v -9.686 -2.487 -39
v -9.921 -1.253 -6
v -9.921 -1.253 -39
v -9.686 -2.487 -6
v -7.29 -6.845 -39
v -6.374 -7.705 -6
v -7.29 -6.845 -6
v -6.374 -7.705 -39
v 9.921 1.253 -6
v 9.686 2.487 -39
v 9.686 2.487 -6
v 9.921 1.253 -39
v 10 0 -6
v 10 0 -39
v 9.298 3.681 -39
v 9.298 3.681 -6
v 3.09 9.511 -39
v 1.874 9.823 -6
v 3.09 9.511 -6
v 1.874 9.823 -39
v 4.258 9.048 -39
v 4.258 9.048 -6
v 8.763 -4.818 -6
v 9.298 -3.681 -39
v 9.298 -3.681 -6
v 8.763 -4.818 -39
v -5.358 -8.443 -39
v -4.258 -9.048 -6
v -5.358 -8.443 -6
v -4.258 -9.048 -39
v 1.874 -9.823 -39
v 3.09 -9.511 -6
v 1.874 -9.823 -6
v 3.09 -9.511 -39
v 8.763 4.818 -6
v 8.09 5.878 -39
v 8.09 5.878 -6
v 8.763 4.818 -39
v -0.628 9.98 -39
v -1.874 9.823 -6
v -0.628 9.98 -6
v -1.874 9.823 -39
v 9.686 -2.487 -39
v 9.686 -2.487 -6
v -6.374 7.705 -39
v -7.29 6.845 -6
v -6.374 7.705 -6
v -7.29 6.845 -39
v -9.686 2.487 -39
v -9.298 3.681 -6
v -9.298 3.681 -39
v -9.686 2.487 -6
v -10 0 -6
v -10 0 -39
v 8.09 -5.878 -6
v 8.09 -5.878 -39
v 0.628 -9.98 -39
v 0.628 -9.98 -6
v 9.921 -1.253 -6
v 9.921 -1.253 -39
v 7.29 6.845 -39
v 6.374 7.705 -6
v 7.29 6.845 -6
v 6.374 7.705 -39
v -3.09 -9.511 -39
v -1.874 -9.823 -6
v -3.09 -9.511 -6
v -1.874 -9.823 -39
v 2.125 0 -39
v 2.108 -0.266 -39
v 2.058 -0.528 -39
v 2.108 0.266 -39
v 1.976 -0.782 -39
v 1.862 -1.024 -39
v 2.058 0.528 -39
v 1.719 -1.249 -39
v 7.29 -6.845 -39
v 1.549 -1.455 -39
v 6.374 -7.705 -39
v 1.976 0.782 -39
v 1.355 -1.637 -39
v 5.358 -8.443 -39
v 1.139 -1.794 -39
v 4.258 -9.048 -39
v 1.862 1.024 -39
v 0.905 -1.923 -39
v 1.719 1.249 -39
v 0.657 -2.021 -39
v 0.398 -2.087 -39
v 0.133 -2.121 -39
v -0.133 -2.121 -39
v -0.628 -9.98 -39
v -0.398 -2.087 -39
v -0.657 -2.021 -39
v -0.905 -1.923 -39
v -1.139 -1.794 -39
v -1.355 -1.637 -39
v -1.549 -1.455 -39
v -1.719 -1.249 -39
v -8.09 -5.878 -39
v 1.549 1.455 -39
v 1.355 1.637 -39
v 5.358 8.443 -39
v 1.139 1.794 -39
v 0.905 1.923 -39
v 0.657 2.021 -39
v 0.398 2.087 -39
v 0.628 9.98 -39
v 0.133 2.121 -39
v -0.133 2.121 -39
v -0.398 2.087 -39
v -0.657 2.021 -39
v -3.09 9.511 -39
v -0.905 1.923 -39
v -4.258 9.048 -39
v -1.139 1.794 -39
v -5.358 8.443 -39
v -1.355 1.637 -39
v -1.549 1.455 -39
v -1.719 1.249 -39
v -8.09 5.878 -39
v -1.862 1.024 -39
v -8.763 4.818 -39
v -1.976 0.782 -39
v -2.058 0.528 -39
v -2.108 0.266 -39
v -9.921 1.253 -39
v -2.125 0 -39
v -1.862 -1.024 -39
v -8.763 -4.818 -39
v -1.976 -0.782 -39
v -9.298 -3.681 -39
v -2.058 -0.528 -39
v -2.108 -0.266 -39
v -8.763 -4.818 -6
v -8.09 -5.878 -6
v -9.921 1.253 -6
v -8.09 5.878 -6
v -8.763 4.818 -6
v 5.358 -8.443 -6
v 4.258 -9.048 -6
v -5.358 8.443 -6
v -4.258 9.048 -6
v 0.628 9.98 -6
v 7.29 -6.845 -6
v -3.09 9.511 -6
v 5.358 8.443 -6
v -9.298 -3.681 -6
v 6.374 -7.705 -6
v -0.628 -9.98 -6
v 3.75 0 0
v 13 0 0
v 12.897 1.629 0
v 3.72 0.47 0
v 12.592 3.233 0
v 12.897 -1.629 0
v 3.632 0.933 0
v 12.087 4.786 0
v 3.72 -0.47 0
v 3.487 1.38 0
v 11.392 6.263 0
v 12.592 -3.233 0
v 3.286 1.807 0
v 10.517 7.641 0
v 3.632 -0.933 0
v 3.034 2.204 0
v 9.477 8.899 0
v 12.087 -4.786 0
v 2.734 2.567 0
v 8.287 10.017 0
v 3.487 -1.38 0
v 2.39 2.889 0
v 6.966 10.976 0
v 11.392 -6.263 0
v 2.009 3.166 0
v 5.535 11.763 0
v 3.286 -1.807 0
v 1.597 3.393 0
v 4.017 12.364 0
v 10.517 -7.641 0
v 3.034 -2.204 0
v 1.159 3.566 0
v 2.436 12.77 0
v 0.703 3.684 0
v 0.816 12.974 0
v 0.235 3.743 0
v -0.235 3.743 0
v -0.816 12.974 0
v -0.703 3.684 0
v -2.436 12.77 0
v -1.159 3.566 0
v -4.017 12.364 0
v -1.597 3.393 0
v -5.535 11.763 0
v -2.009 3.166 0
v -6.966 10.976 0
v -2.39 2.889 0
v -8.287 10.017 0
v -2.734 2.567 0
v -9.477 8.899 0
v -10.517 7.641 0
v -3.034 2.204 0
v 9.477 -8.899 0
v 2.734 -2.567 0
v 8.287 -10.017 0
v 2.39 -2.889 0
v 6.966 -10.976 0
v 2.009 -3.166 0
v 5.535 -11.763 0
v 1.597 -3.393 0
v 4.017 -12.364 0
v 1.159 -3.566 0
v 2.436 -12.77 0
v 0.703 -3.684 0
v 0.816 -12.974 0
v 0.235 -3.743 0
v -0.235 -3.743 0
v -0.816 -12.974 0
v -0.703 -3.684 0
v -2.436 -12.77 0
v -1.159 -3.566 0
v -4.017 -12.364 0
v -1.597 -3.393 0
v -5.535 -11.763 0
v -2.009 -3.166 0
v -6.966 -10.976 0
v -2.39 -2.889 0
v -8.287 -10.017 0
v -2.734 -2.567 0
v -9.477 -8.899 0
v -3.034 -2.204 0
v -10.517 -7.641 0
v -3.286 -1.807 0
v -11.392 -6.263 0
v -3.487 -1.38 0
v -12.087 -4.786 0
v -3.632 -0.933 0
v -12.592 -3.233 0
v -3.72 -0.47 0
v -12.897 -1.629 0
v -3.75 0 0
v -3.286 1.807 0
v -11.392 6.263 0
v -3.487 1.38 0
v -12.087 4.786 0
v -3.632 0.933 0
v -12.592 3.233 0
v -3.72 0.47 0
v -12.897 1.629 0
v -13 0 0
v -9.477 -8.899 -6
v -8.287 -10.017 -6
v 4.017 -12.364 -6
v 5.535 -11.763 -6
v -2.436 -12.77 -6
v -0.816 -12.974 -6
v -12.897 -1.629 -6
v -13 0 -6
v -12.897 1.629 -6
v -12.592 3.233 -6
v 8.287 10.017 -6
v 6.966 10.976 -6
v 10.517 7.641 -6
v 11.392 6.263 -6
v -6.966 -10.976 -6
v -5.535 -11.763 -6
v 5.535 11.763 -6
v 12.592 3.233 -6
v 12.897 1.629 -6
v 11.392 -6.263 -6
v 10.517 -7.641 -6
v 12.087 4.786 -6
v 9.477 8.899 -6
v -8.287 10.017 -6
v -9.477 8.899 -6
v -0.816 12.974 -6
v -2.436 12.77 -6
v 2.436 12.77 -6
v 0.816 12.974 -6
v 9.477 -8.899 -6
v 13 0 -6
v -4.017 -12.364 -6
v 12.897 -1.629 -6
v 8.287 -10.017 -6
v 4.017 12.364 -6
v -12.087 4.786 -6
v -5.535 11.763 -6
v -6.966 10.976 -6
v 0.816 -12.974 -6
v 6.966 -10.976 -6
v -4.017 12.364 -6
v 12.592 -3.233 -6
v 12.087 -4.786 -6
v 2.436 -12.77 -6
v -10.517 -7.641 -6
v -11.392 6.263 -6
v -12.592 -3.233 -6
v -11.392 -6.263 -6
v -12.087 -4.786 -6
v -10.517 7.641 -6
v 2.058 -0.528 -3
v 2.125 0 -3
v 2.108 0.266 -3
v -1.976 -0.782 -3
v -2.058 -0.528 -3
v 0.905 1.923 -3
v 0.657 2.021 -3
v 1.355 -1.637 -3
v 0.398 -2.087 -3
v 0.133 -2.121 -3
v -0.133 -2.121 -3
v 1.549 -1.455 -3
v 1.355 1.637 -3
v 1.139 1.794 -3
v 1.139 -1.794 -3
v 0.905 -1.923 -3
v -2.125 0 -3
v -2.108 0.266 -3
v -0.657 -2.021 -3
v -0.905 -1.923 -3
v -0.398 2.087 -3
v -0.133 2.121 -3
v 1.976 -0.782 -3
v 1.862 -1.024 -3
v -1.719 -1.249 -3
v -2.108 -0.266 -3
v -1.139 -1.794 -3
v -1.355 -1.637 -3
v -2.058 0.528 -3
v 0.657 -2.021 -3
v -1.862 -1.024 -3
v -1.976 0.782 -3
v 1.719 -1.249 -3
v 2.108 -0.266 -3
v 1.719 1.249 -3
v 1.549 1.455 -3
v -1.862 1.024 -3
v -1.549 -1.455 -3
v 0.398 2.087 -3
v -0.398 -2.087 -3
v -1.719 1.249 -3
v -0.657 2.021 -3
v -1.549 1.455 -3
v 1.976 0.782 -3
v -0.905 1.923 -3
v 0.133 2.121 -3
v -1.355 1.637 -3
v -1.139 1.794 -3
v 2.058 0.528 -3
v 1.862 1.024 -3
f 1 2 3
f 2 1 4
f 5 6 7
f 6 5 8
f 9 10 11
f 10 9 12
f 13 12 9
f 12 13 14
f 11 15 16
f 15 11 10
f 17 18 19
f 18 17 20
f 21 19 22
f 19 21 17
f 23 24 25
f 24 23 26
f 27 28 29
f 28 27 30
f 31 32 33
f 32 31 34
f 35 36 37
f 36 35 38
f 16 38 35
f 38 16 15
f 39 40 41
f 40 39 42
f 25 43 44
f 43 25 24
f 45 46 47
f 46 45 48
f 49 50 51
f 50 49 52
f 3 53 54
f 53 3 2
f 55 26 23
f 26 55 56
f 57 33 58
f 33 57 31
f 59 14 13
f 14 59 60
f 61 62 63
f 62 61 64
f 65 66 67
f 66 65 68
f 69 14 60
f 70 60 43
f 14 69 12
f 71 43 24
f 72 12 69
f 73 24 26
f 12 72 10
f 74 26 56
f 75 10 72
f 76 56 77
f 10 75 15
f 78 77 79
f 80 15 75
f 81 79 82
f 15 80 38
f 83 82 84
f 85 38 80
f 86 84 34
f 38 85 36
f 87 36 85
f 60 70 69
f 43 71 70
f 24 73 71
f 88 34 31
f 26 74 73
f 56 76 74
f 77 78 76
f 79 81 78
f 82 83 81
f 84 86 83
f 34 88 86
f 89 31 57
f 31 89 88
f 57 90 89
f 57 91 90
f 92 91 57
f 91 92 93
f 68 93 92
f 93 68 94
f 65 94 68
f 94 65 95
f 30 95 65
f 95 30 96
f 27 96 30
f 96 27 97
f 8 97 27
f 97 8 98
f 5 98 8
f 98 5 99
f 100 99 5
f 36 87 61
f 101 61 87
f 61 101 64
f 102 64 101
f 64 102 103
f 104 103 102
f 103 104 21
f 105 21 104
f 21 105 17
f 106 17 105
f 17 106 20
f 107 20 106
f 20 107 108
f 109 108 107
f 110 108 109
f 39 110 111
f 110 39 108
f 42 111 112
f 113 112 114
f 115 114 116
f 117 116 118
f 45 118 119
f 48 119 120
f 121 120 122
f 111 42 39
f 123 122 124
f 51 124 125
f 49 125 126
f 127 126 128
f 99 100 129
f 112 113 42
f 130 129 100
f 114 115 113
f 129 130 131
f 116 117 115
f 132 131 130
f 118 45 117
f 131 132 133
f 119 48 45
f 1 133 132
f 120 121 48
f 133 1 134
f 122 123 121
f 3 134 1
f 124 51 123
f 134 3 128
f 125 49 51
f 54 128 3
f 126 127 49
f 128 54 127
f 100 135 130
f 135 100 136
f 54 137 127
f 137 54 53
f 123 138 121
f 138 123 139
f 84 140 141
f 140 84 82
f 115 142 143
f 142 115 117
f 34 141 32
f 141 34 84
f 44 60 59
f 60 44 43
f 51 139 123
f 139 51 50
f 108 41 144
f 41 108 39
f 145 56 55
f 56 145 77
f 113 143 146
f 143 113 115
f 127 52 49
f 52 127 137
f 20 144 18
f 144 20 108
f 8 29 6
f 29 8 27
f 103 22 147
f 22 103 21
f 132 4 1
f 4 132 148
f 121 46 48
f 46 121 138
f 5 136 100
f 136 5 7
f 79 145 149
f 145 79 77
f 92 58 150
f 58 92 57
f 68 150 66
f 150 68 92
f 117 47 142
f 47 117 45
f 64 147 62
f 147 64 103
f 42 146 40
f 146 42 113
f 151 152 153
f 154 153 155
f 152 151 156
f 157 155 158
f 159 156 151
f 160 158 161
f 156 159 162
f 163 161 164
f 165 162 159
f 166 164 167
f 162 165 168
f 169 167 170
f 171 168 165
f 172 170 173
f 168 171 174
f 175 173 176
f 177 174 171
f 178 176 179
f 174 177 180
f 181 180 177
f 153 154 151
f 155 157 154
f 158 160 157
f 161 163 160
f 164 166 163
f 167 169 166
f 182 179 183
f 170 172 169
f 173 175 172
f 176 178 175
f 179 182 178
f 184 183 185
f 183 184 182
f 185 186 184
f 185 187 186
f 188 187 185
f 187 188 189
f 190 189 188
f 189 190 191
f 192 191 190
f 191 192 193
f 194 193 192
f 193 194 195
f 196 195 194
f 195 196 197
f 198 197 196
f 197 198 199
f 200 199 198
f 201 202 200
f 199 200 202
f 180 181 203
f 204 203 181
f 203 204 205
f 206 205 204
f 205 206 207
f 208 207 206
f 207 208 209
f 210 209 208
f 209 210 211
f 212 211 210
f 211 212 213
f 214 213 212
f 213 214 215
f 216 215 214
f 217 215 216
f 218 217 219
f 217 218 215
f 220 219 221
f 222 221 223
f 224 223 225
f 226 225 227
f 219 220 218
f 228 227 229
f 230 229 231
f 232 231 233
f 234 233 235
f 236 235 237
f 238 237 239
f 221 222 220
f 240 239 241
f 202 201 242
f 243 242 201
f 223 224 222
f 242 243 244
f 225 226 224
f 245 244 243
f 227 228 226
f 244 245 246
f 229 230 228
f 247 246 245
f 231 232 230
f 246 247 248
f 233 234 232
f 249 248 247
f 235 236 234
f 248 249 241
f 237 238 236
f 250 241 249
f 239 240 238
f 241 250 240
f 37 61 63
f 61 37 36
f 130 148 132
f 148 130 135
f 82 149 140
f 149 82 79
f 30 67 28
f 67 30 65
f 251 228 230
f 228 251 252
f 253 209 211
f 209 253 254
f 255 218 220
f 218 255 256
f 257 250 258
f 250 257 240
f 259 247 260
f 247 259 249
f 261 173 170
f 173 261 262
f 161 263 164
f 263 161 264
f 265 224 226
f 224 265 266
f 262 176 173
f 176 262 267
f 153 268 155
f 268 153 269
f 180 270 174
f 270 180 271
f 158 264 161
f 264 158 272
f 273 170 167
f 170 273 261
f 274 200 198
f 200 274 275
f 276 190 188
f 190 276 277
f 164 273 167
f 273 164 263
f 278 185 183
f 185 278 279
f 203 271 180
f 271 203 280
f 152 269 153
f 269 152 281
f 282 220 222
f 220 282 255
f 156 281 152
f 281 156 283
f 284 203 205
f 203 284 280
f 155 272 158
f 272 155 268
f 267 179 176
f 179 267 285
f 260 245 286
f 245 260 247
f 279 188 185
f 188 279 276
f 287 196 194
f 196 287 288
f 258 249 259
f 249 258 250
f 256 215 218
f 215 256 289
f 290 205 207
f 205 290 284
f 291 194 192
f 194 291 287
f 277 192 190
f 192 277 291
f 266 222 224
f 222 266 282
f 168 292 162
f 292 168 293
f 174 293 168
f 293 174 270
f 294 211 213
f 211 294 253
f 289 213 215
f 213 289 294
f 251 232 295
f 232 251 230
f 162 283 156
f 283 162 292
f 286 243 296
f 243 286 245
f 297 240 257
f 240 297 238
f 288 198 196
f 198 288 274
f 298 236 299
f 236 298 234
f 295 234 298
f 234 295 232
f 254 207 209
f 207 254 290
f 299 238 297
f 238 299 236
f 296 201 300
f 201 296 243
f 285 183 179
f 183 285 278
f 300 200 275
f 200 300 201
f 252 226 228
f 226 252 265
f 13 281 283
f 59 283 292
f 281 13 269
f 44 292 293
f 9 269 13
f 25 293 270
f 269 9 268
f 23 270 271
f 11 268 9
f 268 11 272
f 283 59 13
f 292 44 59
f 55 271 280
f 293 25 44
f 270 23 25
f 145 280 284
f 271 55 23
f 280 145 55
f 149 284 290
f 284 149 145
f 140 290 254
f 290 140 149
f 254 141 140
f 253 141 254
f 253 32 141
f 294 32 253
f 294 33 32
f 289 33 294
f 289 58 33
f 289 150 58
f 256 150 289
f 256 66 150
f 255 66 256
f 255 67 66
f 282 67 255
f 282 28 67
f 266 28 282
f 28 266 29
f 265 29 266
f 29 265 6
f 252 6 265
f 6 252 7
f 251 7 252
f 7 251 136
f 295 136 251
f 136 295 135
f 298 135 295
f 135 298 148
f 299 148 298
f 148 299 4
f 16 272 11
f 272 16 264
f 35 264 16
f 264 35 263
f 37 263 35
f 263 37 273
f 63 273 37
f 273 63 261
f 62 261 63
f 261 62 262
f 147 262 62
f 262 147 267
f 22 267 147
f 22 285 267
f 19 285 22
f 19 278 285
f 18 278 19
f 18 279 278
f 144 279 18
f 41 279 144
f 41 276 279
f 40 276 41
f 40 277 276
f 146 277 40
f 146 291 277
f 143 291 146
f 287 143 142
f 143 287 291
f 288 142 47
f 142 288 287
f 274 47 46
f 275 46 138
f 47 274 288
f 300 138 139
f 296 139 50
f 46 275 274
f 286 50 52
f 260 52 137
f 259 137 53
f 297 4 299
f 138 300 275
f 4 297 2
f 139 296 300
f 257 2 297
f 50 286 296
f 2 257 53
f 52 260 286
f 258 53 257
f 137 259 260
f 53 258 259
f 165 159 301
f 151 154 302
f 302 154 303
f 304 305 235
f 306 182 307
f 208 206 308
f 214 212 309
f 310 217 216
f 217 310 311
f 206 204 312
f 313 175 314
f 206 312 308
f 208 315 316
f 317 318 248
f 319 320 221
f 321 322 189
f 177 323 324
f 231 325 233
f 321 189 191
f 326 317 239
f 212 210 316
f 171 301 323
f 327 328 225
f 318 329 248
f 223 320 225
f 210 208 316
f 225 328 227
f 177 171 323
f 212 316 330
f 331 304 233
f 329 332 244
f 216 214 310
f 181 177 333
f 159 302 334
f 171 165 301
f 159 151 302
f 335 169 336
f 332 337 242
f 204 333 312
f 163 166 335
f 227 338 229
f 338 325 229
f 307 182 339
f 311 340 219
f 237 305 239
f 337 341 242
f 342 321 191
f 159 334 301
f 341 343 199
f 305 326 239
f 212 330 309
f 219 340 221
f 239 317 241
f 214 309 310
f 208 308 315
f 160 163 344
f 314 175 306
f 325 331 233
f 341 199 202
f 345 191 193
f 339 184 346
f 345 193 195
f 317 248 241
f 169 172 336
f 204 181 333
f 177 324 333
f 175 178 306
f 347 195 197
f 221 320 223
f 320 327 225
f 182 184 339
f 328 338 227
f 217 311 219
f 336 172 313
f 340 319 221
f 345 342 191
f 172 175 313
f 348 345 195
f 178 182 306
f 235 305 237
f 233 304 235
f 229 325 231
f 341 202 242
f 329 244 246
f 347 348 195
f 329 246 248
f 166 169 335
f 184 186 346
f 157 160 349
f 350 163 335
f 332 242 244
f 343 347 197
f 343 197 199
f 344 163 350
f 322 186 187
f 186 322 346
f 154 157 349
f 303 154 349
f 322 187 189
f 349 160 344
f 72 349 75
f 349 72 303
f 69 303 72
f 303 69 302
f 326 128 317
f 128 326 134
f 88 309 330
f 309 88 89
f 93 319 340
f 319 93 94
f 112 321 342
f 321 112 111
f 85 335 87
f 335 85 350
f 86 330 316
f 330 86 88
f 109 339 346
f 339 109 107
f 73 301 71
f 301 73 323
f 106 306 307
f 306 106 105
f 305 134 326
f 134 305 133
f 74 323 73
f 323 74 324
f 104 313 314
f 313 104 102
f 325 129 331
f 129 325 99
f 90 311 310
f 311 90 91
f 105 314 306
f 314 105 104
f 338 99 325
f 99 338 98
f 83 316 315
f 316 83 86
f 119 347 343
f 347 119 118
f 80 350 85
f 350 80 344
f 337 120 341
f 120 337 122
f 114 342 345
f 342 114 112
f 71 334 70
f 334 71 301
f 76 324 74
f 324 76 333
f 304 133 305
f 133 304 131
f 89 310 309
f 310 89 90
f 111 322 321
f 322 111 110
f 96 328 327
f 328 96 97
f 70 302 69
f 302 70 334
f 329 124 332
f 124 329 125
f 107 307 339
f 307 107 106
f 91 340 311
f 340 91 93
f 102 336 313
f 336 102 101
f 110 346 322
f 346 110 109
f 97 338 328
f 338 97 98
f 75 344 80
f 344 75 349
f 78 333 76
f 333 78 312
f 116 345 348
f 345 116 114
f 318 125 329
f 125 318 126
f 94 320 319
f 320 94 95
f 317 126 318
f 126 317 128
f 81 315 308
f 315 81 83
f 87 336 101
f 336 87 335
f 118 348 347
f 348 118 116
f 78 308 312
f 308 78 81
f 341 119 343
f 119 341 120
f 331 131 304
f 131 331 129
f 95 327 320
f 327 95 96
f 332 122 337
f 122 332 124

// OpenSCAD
$fn = 50;


difference() {
	union() {
		translate(v = [0, 0, -39.0000000000]) {
			cylinder(h = 39, r = 10.0000000000);
		}
		translate(v = [0, 0, -6.0000000000]) {
			cylinder(h = 6, r = 13.0000000000);
		}
	}
	union() {
		translate(v = [0, 0, 0]) {
			rotate(a = [0, 0, 0]) {
				difference() {
					union() {
						#translate(v = [0, 0, -39.0000000000]) {
							cylinder(h = 39, r = 2.0000000000);
						}
						#translate(v = [0, 0, -3]) {
							cylinder(h = 3, r = 10.0000000000, r1 = 2.1250000000, r2 = 3.7500000000);
						}
						#translate(v = [0, 0, -39.0000000000]) {
							cylinder(h = 39, r = 2.1250000000);
						}
						#translate(v = [0, 0, -39.0000000000]) {
							cylinder(h = 39, r = 2.0000000000);
						}
					}
					union();
				}
			}
		}
	}
}
